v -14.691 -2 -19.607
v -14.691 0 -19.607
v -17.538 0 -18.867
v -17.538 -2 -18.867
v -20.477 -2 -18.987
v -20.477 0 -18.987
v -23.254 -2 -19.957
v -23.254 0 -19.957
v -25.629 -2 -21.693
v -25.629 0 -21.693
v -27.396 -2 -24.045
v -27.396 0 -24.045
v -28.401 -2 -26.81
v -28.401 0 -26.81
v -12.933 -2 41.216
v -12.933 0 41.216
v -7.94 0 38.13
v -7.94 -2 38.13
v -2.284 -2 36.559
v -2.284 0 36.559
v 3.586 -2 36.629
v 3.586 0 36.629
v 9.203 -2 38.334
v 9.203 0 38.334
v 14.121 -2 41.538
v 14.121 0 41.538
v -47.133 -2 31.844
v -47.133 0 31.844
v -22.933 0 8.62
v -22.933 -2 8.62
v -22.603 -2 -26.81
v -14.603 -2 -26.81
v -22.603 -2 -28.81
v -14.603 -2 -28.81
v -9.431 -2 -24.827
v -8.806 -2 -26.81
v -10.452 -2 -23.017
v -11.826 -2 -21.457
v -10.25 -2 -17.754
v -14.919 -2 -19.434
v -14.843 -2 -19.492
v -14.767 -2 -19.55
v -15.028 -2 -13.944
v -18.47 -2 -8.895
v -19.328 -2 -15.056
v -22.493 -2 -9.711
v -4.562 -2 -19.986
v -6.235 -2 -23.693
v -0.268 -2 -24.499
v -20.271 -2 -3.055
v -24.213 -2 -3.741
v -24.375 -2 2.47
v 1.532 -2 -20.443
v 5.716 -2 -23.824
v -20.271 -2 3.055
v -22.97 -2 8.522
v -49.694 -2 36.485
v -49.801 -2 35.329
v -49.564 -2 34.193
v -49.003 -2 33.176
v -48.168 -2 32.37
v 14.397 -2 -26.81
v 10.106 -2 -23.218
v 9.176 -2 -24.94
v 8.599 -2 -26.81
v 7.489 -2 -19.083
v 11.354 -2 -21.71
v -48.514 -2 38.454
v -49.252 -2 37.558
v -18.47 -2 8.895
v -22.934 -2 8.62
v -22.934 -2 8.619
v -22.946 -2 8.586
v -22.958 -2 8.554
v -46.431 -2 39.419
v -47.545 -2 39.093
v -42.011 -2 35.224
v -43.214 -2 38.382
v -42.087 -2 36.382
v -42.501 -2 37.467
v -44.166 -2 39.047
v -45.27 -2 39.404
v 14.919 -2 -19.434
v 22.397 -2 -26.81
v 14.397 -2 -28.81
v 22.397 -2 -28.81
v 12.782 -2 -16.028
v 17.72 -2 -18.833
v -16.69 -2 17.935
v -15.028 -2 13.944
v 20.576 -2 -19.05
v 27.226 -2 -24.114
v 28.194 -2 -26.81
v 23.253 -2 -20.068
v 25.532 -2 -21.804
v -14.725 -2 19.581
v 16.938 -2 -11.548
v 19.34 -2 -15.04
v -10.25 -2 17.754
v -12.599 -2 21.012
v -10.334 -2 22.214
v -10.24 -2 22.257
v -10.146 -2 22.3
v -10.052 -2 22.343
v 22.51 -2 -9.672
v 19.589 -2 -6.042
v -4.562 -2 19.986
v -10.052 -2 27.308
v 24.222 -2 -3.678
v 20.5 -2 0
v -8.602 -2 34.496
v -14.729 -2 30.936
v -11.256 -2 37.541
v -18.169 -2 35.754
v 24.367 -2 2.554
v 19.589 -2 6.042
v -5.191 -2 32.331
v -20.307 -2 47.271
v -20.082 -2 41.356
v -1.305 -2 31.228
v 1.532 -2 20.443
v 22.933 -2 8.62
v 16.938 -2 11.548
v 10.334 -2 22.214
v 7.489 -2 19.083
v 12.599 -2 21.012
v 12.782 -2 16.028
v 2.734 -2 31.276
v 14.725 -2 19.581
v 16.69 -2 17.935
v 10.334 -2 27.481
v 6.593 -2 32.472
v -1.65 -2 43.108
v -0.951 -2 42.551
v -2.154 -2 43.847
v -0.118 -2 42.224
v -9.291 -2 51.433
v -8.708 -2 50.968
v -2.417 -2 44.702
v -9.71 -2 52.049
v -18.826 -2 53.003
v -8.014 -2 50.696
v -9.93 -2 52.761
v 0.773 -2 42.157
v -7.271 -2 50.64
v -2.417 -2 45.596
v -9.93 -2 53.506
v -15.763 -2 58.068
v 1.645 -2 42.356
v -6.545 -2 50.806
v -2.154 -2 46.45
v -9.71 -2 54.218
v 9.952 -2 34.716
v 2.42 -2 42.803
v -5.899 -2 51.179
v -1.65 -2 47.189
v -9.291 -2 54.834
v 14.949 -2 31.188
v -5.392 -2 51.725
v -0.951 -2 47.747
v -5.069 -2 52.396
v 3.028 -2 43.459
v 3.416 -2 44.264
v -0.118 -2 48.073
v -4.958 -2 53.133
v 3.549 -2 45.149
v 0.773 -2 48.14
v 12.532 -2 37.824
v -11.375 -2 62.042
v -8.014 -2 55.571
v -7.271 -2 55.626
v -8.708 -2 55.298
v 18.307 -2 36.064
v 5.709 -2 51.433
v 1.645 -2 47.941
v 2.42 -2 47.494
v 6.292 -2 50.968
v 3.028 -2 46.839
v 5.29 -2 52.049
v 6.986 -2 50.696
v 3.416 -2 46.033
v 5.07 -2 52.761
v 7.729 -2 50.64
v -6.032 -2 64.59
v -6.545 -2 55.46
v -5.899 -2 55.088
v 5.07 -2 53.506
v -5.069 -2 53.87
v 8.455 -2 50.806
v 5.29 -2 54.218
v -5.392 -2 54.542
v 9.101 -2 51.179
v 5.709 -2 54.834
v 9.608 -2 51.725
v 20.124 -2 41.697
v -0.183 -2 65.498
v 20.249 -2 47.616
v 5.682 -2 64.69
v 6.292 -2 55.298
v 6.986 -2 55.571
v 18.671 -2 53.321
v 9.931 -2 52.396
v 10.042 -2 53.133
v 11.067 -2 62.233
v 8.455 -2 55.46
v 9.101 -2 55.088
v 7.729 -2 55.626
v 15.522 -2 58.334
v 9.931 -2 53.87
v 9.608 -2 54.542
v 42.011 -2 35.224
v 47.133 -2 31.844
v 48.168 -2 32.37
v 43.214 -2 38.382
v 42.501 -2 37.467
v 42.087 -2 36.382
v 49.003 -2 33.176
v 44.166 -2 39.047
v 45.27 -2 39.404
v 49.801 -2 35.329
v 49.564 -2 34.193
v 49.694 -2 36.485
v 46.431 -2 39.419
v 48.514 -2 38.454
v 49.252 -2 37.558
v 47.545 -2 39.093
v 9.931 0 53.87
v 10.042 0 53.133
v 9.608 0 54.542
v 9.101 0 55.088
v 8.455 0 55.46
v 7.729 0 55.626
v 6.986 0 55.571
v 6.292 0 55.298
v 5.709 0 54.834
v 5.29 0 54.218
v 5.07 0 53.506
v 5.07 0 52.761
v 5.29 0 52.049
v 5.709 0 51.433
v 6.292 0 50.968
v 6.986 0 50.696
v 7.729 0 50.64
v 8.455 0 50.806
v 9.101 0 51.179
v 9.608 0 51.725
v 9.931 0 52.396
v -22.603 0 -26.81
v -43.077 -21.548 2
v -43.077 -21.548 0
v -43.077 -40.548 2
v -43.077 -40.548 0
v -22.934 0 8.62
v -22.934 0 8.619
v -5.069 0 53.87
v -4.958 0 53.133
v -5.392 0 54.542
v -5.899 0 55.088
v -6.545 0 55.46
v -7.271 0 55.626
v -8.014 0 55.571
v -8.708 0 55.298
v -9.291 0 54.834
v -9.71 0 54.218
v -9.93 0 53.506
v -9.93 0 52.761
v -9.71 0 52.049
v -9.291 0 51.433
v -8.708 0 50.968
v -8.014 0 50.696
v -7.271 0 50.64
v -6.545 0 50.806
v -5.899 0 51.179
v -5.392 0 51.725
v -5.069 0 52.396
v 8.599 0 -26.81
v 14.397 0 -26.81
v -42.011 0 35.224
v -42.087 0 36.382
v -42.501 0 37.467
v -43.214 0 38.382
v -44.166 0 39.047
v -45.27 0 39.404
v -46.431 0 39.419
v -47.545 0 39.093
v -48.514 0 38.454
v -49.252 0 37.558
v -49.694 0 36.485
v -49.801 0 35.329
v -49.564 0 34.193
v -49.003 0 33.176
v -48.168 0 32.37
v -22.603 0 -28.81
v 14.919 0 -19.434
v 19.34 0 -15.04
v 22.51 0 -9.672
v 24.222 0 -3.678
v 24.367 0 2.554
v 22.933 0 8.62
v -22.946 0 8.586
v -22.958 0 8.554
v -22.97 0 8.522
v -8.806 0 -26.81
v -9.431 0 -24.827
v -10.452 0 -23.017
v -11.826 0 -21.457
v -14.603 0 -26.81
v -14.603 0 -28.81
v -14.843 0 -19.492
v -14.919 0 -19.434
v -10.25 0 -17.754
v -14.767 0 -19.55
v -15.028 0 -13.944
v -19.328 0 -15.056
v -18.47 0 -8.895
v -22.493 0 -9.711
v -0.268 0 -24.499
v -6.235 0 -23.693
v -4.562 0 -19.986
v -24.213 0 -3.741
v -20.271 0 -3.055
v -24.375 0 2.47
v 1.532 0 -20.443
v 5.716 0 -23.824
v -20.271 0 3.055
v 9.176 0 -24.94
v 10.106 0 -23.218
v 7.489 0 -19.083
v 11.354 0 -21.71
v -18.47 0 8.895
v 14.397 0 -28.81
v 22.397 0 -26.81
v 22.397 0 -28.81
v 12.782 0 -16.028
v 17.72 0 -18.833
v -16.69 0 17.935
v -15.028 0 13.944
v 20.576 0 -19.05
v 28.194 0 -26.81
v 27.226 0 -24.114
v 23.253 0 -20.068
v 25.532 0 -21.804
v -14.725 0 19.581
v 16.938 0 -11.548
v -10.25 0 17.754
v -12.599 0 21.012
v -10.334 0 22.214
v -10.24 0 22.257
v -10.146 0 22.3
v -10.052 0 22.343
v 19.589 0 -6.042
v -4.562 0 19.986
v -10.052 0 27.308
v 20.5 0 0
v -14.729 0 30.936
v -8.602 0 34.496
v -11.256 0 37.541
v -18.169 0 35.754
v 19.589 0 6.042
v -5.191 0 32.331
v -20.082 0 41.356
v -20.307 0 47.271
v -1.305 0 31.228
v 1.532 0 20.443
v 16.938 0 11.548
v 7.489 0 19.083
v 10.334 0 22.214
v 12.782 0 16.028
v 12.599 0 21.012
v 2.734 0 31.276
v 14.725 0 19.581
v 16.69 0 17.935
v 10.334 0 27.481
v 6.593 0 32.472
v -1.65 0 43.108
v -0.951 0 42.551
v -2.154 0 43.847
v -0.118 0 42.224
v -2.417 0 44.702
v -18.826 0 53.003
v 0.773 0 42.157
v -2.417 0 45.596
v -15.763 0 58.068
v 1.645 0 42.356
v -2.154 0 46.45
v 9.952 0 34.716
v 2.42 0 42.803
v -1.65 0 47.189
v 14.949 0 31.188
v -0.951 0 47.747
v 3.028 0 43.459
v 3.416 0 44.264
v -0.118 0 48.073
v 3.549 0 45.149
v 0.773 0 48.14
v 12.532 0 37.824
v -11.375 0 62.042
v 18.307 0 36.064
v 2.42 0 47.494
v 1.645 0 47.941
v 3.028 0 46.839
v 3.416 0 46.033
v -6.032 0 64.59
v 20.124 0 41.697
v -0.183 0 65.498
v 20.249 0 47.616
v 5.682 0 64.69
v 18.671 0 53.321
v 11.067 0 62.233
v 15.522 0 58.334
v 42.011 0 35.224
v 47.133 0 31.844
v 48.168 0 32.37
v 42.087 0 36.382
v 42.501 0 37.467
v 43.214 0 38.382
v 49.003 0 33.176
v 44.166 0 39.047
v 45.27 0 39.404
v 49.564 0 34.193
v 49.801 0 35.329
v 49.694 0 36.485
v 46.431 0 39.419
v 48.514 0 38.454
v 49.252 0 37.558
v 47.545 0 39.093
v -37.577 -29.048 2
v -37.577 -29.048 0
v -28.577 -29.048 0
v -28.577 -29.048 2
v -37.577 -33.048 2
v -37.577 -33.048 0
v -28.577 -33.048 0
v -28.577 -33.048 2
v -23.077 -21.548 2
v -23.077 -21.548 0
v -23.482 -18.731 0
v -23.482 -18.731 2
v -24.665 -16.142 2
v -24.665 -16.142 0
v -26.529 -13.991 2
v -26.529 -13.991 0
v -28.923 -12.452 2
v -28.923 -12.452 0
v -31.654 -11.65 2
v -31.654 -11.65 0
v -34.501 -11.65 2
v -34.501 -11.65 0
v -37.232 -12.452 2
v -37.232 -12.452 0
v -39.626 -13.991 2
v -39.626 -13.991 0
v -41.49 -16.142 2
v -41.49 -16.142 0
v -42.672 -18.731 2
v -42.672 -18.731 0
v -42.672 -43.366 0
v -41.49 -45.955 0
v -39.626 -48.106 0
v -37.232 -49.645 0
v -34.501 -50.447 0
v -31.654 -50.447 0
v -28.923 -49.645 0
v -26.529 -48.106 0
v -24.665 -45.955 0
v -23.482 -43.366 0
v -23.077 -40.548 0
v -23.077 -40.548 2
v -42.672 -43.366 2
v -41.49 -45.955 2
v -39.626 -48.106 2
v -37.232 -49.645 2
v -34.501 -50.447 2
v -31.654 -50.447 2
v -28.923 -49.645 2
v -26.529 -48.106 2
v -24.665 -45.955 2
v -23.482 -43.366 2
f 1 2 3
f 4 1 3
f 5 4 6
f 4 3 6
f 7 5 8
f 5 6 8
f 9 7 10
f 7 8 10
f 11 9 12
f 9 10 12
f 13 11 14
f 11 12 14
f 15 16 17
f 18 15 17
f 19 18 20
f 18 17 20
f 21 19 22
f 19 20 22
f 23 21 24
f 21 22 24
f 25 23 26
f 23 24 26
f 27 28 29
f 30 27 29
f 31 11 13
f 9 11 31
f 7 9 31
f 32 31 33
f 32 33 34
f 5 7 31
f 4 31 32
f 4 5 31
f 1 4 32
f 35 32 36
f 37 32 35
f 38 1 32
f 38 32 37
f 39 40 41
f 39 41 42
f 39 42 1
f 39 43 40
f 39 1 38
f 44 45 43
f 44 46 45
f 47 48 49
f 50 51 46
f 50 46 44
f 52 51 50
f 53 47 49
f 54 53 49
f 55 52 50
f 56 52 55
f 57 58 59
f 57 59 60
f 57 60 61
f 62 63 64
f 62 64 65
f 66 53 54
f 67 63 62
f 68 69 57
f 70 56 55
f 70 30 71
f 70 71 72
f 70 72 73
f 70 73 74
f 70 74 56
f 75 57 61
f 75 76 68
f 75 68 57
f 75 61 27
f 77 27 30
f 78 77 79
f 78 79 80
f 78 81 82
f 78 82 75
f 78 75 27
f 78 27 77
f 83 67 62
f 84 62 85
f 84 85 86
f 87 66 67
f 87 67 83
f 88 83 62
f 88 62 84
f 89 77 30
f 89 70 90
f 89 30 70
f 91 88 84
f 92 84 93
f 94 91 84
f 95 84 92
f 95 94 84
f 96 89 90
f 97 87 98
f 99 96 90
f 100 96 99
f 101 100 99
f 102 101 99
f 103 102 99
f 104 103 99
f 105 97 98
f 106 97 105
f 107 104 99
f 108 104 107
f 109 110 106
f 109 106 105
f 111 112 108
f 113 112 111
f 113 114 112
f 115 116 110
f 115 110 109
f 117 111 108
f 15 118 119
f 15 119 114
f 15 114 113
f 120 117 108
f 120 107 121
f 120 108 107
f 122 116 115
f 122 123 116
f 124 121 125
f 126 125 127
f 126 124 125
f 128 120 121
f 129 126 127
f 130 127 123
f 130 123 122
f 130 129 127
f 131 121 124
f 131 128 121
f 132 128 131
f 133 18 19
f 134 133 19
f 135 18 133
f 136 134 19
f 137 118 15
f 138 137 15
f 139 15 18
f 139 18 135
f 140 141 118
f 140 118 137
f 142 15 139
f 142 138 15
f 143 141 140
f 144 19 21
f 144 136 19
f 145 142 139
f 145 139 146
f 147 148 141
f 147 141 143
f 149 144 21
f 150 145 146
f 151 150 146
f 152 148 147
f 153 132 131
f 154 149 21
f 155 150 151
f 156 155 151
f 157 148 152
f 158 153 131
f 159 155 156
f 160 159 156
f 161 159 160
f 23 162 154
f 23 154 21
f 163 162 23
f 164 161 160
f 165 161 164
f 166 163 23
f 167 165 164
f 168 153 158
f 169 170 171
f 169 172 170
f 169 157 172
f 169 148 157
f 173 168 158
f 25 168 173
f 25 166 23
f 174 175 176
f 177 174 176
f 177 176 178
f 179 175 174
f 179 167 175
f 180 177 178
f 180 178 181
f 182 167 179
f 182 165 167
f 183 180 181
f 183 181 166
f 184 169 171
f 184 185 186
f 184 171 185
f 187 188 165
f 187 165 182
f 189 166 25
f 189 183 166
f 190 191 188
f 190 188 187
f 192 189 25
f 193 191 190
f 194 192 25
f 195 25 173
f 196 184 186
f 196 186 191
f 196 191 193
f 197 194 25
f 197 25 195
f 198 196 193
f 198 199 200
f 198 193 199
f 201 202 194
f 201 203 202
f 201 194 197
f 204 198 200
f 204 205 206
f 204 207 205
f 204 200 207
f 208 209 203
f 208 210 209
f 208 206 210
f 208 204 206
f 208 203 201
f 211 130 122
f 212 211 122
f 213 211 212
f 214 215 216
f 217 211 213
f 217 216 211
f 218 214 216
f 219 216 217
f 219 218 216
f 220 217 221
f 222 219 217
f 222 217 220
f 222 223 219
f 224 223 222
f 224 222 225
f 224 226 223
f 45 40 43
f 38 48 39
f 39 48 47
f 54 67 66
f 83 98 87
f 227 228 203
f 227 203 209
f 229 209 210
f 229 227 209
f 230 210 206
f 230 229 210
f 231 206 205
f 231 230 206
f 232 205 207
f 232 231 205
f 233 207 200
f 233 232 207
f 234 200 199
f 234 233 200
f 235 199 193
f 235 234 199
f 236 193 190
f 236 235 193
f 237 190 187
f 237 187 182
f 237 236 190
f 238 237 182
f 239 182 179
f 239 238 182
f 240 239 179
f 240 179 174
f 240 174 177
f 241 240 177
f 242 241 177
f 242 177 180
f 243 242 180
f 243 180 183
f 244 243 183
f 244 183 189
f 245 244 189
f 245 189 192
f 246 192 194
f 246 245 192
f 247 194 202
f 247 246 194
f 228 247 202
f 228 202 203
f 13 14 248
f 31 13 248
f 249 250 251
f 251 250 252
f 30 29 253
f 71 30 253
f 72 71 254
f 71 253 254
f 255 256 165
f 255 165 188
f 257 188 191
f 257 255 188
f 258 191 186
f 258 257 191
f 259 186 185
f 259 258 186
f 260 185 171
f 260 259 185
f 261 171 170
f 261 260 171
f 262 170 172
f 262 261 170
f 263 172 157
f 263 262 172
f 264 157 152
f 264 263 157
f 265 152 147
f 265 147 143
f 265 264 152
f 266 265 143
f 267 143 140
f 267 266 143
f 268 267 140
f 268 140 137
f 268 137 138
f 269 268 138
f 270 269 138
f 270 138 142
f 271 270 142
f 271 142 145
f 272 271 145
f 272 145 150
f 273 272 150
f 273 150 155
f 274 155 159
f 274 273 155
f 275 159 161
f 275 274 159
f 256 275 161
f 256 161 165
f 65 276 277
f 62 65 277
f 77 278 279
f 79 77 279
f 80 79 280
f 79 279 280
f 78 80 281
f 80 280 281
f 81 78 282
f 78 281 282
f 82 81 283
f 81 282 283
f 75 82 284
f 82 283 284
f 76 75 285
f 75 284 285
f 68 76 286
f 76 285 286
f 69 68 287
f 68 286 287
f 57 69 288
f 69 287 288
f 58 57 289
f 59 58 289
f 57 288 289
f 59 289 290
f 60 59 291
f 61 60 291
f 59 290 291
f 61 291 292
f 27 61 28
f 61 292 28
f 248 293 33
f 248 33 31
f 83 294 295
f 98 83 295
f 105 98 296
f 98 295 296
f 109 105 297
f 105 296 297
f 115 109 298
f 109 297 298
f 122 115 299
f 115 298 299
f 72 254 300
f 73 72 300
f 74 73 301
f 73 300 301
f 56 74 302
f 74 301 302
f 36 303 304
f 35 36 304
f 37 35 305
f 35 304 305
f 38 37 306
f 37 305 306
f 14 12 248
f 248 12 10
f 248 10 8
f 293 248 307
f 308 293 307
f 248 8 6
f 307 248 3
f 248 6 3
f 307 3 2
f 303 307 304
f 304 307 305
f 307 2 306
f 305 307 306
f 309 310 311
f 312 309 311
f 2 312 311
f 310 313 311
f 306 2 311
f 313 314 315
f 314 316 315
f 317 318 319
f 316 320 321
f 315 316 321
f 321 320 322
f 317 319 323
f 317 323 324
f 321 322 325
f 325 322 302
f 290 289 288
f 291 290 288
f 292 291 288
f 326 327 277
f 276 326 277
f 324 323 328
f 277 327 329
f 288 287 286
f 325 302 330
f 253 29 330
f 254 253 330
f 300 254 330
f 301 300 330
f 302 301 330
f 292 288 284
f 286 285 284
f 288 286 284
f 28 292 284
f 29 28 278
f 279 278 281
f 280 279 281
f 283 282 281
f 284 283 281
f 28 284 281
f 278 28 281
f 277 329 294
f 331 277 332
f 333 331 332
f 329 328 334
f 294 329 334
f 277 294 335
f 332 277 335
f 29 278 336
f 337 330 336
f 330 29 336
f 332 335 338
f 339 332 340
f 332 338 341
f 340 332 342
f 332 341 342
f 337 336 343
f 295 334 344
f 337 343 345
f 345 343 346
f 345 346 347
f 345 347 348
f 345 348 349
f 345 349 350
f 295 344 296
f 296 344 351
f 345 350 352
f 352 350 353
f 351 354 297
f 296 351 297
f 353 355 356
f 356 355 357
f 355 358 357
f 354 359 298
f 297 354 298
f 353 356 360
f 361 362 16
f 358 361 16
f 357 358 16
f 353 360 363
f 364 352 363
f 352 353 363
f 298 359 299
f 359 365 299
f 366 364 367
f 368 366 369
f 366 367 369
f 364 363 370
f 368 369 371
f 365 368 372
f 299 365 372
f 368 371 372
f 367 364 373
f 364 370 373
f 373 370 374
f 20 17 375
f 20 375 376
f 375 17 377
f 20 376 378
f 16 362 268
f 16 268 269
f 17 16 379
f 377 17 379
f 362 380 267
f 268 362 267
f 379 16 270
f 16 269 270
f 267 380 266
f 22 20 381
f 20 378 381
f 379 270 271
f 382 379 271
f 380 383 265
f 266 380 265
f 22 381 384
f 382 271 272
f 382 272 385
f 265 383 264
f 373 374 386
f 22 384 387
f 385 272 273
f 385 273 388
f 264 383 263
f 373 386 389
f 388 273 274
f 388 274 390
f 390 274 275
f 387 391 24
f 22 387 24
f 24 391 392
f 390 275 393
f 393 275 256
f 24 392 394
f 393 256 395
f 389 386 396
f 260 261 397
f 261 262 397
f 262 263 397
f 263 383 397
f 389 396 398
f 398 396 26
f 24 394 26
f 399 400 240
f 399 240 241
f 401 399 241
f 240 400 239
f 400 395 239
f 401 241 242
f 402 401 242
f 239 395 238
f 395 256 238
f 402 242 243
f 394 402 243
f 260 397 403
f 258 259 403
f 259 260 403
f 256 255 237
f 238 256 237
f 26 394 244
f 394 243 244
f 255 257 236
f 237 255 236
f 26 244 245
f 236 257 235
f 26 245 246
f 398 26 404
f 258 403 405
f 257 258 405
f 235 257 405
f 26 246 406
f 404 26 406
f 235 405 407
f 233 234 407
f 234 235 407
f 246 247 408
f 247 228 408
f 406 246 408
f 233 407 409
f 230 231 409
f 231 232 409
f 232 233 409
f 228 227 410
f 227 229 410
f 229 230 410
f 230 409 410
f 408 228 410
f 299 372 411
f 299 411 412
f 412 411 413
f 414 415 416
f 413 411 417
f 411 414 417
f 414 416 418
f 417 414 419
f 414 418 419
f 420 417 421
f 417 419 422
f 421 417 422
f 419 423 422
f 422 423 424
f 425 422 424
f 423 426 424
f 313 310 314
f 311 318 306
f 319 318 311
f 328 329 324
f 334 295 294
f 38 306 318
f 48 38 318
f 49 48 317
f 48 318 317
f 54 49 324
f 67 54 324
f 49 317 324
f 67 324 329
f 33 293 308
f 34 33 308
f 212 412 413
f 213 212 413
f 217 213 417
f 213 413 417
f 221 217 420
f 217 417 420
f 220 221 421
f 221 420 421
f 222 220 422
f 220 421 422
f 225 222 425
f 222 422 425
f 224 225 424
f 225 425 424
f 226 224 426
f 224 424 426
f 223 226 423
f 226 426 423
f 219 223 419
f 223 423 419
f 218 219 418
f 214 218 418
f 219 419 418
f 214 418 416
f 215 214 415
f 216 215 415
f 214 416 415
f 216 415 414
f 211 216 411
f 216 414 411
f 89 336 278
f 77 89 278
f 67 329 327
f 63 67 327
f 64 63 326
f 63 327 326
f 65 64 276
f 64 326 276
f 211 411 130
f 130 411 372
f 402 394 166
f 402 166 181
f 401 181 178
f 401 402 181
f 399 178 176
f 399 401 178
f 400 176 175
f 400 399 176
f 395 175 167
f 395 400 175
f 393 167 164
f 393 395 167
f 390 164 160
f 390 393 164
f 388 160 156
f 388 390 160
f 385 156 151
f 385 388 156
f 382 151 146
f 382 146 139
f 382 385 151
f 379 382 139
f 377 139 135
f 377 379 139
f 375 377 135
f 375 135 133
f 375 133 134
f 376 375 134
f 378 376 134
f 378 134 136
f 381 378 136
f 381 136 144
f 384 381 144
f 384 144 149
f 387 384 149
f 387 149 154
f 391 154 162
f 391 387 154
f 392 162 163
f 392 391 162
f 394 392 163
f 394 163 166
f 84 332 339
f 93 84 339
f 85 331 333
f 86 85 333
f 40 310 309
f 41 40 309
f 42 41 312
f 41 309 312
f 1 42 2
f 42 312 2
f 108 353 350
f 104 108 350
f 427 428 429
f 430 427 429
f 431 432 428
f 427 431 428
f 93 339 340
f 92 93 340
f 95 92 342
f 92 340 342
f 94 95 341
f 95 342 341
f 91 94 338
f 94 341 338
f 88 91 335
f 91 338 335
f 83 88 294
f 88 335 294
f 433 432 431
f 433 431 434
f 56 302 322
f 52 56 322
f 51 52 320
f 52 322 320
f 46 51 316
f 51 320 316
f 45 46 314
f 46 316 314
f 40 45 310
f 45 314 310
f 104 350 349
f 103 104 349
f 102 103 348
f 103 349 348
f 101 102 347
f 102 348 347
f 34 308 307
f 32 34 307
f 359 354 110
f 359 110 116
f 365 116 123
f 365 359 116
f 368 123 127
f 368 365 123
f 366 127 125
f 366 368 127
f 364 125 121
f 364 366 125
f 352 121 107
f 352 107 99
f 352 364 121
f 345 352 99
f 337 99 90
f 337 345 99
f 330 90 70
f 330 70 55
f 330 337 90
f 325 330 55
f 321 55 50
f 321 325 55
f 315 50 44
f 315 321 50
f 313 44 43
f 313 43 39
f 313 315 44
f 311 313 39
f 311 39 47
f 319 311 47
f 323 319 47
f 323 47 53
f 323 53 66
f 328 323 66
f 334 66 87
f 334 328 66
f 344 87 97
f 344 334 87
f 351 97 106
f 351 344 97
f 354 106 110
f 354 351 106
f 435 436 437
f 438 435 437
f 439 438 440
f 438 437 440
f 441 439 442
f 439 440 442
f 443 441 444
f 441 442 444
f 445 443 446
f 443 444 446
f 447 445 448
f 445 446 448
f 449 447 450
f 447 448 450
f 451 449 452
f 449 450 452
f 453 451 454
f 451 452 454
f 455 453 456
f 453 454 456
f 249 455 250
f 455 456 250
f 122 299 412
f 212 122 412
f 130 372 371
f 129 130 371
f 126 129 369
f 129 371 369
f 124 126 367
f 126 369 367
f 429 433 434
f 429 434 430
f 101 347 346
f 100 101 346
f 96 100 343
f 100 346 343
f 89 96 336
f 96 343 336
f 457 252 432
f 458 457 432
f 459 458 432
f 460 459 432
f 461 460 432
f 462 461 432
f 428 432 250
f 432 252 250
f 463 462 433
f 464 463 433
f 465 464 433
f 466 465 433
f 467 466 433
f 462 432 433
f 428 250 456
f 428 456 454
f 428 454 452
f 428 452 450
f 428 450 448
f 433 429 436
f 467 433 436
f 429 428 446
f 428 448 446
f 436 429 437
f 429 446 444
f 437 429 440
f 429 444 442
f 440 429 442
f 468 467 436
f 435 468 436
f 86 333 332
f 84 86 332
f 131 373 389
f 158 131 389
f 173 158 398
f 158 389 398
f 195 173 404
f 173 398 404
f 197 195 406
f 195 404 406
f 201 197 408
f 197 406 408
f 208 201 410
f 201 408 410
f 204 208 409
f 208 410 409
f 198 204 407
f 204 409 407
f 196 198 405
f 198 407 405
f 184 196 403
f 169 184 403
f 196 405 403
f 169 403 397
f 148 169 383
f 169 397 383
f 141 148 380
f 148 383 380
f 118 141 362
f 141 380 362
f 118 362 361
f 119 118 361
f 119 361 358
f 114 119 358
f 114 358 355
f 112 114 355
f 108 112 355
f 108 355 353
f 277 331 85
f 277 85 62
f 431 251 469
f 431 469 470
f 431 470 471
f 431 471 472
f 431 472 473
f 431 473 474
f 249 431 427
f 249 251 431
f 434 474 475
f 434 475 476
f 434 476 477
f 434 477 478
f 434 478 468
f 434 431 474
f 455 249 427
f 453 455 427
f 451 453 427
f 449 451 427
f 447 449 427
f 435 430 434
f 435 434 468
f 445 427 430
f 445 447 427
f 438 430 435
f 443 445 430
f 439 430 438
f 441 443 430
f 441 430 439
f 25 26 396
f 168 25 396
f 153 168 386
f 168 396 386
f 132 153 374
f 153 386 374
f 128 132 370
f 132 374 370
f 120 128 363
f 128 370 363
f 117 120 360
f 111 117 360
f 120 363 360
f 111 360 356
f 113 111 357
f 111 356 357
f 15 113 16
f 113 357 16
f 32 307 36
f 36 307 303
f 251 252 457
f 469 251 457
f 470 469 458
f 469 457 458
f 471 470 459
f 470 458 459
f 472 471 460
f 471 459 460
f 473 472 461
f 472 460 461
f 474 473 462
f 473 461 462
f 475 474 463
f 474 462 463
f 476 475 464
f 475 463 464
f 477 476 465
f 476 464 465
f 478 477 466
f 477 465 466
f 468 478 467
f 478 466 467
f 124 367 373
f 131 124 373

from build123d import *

# Parameters (mm, degrees)
F0_R     = 20.5
F0_R_2   = 2.5
F0_R_3   = 3
F0_W     = 8
F0_H     = 2
F1_DEPTH = 2
F2_W     = 9
F2_H     = 4
F3_DEPTH = 2


# Not quite as in the source:
# - a feature names something its author has since deleted; it is built from what else it names


with BuildPart() as f1:
    # F0 (on Front) → F1 (new body)
    with BuildSketch(Plane.XZ):
        with BuildLine():
            Line((-10.0518541032, 27.3076325654), (-10.0518541032, 22.3430129814))
            ThreePointArc((-10.0518541032, 22.3430129814), (-10.1932123132, 22.2788783995), (-10.3341613447, 22.2138494931))
            ThreePointArc((-10.3341613447, 22.2138494931), (-13.6806146729, 20.3246348595), (-16.6904854096, 17.9353755688))
            Line((-16.6904854096, 17.9353755688), (-42.0114619192, 35.2237376845))
            ThreePointArc((-42.0114619192, 35.2237376845), (-48.0533290823, 38.8096157049), (-47.1334807155, 31.8442328026))
            Line((-47.1334807155, 31.8442328026), (-22.9334270643, 8.620204353))
            ThreePointArc((-22.9334270643, 8.620204353), (-22.9337135716, 8.6194420827), (-22.9340000535, 8.6186798029))
            ThreePointArc((-22.9340000535, 8.6186798029), (-22.9521939831, 8.5701103472), (-22.9702850527, 8.5215024848))
            ThreePointArc((-22.9702850527, 8.5215024848), (-23.543020169, -6.7805752945), (-14.9189118524, -19.4338897069))
            ThreePointArc((-14.9189118524, -19.4338897069), (-14.8050096032, -19.5208014858), (-14.6906010516, -19.6070456914))
            ThreePointArc((-14.6906010516, -19.6070456914), (-23.2540973357, -19.9569387989), (-28.4014469494, -26.809725513))
            Line((-28.4014469494, -26.809725513), (-22.6034879783, -26.809725513))
            Line((-22.6034879783, -26.809725513), (-14.6034879783, -26.809725513))
            Line((-14.6034879783, -26.809725513), (-8.8055290071, -26.809725513))
            ThreePointArc((-8.8055290071, -26.809725513), (-9.8942672501, -23.8955140495), (-11.8258820824, -21.4568989598))
            ThreePointArc((-11.8258820824, -21.4568989598), (-0.2678936029, -24.4985353239), (11.3538442484, -21.7103712724))
            ThreePointArc((11.3538442484, -21.7103712724), (9.5986412165, -24.0560459597), (8.5985530506, -26.809725513))
            Line((8.5985530506, -26.809725513), (14.3965120217, -26.809725513))
            Line((14.3965120217, -26.809725513), (22.3965120217, -26.809725513))
            Line((22.3965120217, -26.809725513), (28.1944709929, -26.809725513))
            ThreePointArc((28.1944709929, -26.809725513), (23.2532055786, -20.0682995598), (14.9189118524, -19.4338897069))
            ThreePointArc((14.9189118524, -19.4338897069), (23.5575452615, -6.7299376857), (22.9334270643, 8.620204353))
            Line((22.9334270643, 8.620204353), (47.1334807155, 31.8442328026))
            ThreePointArc((47.1334807155, 31.8442328026), (48.0533290823, 38.8096157049), (42.0114619192, 35.2237376845))
            Line((42.0114619192, 35.2237376845), (16.6904854096, 17.9353755688))
            ThreePointArc((16.6904854096, 17.9353755688), (13.6806146729, 20.3246348595), (10.3341613447, 22.2138494931))
            Line((10.3341613447, 22.2138494931), (10.3341613447, 27.4808270977))
            ThreePointArc((10.3341613447, 27.4808270977), (-0.1825659758, 65.4979309649), (-10.0518541032, 27.3076325654))
        make_face()
        Circle(F0_R, mode=Mode.SUBTRACT)
        with Locations((-7.4579087086, 53.1332939863)):
            Circle(F0_R_2, mode=Mode.SUBTRACT)
        with BuildLine():
            ThreePointArc((14.1213098541, 41.5384881198), (0.7163199464, 31.1055576115), (-12.9332384095, 41.2164106965))
            ThreePointArc((-12.9332384095, 41.2164106965), (0.6534592539, 36.3858645098), (14.1213098541, 41.5384881198))
        make_face(mode=Mode.SUBTRACT)
        with Locations((0.5491401715, 45.1486819078)):
            Circle(F0_R_3, mode=Mode.SUBTRACT)
        with Locations((7.5420912914, 53.1332939863)):
            Circle(F0_R_2, mode=Mode.SUBTRACT)
        with Locations((18.3965120217, -27.809725513)):
            Rectangle(F0_W, F0_H)
        with Locations((-18.6034879783, -27.809725513)):
            Rectangle(F0_W, F0_H)
    extrude(amount=F1_DEPTH)


with BuildPart() as f3:
    # F2 (on Top) → F3 (new body)
    with BuildSketch(Plane.XY):
        with BuildLine():
            ThreePointArc((-23.0774022639, -21.5484288931), (-33.0774022639, -11.5484288931), (-43.0774022639, -21.5484288931))
            Line((-43.0774022639, -21.5484288931), (-43.0774022639, -40.5484288931))
            ThreePointArc((-43.0774022639, -40.5484288931), (-33.0774022639, -50.5484288931), (-23.0774022639, -40.5484288931))
            Line((-23.0774022639, -40.5484288931), (-23.0774022639, -21.5484288931))
        make_face()
        with Locations((-33.0774022639, -31.0484288931)):
            Rectangle(F2_W, F2_H, mode=Mode.SUBTRACT)
    extrude(amount=F3_DEPTH)


solid = Compound([f1.part, f3.part])
